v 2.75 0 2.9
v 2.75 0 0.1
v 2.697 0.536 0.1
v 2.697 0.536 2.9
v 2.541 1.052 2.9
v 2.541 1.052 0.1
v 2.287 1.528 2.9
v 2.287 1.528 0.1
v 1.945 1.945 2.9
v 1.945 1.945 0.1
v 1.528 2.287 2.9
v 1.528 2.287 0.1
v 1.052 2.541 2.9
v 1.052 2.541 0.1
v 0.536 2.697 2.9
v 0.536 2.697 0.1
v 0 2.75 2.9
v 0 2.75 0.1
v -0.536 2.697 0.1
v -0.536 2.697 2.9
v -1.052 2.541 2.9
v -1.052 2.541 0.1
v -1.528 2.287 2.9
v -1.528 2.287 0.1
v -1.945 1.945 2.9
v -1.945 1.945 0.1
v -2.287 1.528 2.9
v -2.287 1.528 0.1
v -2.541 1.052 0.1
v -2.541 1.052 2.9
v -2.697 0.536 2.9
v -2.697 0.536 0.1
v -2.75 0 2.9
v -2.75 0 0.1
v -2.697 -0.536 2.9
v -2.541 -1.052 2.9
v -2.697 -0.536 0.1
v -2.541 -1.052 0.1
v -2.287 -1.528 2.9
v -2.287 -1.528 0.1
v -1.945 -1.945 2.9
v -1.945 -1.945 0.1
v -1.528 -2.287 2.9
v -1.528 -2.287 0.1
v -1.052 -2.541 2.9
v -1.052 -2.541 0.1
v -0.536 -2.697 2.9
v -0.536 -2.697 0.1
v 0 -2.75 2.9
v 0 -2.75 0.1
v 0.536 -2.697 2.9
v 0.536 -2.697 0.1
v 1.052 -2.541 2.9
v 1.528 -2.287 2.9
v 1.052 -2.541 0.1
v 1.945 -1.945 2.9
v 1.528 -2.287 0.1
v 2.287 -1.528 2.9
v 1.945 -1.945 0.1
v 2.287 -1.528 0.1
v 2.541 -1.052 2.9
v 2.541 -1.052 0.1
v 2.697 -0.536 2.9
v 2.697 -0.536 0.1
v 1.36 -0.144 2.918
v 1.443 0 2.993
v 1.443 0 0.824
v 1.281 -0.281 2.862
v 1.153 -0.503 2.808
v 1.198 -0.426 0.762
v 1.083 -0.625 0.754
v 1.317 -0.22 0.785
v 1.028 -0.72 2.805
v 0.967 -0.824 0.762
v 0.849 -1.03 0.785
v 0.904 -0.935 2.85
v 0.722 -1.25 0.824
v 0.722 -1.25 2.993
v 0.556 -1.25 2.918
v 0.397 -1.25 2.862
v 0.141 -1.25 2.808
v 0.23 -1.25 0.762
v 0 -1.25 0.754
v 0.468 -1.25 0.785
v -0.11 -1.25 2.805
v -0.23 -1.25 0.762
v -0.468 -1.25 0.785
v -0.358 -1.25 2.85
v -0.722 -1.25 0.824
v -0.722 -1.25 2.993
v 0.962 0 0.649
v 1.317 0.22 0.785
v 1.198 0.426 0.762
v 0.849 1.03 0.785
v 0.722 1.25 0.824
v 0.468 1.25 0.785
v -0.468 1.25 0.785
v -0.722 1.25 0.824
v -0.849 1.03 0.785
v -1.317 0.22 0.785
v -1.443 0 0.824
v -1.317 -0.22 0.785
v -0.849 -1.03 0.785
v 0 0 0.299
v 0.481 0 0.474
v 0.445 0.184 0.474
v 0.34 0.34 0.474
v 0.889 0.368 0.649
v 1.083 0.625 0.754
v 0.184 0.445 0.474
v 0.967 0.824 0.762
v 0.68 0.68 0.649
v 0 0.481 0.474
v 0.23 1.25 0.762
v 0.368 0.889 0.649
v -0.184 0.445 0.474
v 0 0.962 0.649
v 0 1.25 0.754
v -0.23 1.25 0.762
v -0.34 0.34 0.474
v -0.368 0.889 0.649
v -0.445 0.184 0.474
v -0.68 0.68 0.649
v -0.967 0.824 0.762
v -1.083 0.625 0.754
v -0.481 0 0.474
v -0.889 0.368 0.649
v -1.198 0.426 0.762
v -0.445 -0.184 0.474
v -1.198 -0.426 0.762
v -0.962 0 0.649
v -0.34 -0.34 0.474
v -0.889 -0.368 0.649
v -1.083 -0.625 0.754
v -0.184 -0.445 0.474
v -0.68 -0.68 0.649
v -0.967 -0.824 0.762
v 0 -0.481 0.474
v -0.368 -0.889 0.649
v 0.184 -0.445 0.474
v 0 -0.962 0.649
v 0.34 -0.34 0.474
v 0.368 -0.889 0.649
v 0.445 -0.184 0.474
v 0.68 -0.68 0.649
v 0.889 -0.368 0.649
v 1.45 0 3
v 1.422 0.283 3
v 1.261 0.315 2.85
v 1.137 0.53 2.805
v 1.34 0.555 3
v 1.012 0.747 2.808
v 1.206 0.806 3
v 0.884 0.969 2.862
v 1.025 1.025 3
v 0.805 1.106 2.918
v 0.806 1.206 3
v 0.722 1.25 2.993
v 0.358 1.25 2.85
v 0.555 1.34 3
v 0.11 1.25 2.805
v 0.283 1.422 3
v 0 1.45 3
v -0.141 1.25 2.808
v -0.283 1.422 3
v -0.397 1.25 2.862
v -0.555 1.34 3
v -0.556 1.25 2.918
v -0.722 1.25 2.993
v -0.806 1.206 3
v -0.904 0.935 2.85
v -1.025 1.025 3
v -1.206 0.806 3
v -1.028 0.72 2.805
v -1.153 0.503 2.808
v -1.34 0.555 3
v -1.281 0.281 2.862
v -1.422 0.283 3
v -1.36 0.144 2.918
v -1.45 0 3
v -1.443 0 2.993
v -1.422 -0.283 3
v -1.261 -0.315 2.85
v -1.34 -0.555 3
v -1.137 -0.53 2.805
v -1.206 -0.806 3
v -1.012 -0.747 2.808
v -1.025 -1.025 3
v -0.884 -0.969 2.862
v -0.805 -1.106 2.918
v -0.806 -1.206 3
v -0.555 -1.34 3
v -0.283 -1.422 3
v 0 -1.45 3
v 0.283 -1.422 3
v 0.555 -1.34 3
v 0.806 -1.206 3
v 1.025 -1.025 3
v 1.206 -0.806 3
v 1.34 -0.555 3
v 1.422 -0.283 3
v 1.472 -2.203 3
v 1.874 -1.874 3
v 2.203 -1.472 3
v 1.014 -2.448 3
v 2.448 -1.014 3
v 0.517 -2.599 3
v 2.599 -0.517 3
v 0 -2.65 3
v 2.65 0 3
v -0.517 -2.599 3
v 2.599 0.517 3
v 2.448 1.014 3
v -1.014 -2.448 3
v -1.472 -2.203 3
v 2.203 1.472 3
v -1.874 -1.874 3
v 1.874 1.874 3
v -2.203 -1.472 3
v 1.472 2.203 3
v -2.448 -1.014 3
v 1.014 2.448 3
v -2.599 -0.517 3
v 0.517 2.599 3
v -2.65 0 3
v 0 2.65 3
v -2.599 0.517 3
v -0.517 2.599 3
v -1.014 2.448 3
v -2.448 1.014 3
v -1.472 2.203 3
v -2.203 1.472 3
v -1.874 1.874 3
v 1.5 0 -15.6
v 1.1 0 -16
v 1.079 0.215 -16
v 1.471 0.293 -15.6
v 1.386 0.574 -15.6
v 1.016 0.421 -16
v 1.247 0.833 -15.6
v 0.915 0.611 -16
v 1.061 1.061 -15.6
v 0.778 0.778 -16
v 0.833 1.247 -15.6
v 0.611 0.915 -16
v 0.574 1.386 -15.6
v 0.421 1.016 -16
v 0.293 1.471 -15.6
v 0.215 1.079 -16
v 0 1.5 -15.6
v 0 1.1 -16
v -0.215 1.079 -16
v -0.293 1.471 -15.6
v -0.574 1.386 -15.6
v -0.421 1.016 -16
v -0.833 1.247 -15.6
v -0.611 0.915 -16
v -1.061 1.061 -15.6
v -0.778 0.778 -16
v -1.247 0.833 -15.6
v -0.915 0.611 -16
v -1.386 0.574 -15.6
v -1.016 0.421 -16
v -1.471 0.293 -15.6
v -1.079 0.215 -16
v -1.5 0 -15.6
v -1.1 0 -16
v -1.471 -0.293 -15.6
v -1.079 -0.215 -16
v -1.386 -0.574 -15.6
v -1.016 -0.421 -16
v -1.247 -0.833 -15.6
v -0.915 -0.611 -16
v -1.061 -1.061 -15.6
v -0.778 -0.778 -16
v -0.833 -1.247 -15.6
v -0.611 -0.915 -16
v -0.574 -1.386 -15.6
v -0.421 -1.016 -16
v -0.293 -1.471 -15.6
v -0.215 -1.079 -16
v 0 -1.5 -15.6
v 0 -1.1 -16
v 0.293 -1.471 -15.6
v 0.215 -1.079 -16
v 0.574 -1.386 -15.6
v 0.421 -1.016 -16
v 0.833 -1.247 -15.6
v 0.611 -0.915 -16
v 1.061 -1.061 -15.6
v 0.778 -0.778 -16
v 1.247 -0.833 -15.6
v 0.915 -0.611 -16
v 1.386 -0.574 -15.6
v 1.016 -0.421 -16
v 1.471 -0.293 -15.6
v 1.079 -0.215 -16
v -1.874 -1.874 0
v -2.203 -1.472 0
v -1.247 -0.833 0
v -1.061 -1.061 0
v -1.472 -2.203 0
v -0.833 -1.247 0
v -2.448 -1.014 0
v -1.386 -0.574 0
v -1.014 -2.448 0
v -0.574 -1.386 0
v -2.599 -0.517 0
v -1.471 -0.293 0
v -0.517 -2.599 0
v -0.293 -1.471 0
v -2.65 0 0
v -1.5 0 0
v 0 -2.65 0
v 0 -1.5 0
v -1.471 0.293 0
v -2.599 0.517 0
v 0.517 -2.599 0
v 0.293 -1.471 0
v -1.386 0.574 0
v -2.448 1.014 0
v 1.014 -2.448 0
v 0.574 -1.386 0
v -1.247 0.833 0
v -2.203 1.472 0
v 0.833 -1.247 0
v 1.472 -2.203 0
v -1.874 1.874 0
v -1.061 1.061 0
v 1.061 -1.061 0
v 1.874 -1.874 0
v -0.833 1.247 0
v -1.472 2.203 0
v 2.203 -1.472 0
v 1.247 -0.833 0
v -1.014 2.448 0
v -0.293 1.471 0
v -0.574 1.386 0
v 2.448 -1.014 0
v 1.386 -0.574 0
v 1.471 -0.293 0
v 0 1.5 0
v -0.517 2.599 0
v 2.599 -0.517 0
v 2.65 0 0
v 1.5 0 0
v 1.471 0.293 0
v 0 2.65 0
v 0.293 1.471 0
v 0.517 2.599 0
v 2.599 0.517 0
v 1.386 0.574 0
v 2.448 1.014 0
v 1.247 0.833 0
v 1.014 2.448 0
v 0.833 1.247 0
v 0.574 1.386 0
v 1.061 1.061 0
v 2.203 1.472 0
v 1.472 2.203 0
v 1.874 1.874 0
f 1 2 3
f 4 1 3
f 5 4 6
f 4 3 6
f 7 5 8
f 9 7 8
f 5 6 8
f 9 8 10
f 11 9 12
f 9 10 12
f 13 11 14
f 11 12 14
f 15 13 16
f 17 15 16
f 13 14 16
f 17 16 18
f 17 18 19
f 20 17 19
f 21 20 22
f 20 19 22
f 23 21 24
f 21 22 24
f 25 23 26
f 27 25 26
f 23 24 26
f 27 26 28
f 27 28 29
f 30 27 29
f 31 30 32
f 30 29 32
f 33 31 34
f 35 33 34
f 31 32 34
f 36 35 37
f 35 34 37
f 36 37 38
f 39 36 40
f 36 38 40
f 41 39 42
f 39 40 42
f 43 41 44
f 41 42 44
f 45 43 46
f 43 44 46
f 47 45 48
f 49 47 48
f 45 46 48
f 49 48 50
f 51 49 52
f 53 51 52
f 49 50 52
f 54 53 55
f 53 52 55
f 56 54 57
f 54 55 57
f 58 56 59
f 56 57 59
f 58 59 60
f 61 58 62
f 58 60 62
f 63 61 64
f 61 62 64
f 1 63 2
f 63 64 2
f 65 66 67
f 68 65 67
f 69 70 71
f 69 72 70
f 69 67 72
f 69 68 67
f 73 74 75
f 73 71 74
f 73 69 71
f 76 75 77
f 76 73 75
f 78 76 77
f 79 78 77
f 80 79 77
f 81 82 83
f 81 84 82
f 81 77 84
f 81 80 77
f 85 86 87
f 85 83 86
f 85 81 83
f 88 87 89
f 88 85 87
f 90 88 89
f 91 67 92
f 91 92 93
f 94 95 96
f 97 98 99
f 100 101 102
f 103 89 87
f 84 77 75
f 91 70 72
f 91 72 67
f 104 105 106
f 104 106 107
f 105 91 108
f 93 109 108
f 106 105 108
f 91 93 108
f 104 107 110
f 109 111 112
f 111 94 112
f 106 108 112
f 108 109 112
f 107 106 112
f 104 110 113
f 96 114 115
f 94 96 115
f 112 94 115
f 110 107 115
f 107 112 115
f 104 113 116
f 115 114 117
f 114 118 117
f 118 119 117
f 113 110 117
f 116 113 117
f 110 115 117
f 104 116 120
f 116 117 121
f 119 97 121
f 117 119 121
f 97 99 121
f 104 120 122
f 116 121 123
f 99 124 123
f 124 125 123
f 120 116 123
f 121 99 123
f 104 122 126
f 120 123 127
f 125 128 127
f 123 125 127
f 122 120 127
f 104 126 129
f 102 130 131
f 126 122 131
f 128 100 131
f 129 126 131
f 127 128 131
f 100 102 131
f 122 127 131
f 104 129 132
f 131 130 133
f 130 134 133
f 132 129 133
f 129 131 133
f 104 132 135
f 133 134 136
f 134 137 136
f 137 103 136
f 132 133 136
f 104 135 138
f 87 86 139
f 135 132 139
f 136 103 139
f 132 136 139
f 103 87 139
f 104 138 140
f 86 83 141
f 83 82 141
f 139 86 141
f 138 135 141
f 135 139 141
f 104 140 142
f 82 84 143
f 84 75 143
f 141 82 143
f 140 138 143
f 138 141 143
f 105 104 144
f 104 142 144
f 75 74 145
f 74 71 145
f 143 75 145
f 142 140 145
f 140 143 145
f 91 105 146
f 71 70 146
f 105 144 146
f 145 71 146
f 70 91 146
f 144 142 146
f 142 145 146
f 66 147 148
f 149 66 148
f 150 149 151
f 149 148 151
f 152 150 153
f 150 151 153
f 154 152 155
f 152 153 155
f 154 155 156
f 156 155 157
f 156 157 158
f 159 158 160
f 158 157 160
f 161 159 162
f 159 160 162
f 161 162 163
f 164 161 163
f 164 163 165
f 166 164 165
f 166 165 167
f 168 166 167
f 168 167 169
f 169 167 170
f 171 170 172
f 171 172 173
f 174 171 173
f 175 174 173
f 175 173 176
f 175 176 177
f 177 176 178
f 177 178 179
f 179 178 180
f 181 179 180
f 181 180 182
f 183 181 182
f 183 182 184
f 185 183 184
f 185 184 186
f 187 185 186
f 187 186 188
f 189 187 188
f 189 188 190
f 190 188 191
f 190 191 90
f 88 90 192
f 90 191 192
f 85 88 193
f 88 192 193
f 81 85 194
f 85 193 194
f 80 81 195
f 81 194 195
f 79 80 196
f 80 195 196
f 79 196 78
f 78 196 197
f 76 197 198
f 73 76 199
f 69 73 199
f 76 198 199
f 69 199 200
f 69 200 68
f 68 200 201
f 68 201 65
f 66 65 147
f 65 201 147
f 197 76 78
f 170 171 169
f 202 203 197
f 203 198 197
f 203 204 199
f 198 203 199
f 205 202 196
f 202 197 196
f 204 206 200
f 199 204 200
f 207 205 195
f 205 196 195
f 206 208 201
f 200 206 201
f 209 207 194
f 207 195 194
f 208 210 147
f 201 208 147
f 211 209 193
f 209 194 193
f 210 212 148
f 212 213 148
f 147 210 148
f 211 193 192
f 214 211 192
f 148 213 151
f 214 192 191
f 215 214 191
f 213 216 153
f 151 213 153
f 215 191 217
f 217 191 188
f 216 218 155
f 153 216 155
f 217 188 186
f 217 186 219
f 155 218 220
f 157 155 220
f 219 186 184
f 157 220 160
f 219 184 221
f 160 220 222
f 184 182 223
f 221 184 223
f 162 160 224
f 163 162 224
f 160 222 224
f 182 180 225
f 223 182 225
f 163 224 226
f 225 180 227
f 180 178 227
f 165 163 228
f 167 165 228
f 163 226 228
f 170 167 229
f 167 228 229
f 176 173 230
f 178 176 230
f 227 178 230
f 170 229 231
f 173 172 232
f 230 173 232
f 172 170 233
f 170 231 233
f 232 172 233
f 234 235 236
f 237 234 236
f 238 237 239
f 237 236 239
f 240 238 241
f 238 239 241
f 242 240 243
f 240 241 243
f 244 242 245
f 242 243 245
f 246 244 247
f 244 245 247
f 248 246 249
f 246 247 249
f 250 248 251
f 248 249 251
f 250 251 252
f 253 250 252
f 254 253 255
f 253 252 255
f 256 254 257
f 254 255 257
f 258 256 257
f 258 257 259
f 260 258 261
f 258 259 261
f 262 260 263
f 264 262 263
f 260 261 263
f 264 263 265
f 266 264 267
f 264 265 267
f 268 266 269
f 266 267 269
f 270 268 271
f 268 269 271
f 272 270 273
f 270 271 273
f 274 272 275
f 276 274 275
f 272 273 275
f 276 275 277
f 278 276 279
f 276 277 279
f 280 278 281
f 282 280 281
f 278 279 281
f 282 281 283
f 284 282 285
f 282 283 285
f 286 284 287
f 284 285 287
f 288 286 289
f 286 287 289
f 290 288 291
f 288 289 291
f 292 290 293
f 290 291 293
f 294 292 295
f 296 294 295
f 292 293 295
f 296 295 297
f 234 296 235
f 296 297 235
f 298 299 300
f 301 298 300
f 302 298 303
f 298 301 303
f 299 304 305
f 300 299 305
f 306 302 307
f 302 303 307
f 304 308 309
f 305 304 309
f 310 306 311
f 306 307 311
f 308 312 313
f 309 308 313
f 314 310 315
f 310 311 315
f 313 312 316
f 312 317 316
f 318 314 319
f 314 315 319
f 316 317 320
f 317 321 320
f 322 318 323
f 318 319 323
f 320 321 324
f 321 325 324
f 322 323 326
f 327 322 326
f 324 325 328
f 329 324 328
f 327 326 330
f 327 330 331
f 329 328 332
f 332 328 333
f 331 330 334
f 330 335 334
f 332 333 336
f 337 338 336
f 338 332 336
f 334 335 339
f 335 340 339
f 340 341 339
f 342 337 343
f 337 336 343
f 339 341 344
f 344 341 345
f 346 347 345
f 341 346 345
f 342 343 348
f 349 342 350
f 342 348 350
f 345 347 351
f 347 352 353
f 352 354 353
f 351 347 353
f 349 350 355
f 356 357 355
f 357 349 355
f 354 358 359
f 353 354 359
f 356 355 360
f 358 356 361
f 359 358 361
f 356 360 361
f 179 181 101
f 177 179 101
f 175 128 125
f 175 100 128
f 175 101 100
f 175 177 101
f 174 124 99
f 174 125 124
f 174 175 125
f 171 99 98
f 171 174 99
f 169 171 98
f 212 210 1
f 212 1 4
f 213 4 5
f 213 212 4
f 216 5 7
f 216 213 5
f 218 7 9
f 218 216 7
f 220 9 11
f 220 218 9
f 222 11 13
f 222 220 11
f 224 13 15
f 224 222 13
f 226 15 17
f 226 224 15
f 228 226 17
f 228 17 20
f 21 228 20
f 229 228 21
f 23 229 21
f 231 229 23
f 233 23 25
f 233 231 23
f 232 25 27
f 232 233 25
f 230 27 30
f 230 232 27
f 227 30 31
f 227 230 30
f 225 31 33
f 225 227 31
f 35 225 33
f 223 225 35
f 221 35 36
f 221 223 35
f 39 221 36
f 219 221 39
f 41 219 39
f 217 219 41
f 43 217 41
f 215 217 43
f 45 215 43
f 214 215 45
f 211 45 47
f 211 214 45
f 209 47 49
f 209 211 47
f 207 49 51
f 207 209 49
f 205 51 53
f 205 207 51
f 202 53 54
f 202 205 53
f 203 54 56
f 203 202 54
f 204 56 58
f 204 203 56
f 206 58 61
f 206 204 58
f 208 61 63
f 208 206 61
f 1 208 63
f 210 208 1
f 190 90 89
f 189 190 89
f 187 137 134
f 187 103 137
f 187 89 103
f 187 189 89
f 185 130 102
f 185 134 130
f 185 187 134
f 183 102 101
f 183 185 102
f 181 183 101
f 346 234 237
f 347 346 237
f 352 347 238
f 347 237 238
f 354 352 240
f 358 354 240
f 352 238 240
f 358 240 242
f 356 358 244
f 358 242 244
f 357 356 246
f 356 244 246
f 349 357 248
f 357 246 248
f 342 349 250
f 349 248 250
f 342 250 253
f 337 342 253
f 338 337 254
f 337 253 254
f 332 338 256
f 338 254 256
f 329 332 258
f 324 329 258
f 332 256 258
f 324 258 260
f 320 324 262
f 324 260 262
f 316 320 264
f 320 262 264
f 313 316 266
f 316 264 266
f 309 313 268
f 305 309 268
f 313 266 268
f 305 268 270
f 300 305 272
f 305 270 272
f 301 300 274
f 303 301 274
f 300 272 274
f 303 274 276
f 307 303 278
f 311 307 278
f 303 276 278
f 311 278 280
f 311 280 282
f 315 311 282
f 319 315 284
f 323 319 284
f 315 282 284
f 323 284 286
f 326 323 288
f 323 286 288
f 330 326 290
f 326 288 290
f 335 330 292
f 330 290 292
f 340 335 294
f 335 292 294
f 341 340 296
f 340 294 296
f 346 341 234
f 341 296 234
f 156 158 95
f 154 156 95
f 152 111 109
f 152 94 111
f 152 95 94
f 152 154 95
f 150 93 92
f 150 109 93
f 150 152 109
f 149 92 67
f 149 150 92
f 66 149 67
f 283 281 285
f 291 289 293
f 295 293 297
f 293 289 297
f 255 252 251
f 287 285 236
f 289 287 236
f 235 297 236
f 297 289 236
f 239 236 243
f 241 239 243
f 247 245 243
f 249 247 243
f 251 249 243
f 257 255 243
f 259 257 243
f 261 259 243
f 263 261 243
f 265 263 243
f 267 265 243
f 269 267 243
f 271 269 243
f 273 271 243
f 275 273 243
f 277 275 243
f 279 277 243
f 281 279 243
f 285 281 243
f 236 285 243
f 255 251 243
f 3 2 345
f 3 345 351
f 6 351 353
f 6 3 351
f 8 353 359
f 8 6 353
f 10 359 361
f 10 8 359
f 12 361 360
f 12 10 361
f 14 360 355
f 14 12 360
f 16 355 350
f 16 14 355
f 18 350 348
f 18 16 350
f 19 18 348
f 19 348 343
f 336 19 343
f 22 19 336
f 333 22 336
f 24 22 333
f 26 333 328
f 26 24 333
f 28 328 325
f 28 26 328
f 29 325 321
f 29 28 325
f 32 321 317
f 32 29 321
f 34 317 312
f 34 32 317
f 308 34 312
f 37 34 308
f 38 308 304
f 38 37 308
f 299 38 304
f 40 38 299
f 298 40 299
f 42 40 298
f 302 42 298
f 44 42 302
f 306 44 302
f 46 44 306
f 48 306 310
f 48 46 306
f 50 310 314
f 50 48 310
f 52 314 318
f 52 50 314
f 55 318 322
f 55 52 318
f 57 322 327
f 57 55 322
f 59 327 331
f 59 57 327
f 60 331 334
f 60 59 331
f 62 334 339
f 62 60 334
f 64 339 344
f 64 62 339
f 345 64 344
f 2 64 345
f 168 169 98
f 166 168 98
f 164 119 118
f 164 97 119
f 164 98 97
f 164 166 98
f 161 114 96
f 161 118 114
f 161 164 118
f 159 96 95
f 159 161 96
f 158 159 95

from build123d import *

# Parameters (mm, degrees)
SKETCH001_R     = 3.75
POCKET_DEPTH    = 9.70192
CHAMFER_SIZE    = 0.4
CHAMFER001_SIZE = 0.1


with BuildPart() as pocket:
    # Sketch003 → Revolution001 (revolve)
    with BuildSketch(Plane.XZ):
        Polygon((0, 0.29908), (2.75, 1.3), (2.75, 10), (0, 10), align=None)
    revolve(axis=Axis((0, 0, 0), (0, 0, 1)))

    # Sketch001 → Pocket (cut, through all)
    with BuildSketch(Plane(origin=(0, 0, 10), x_dir=(-1, 0, 0), z_dir=(0, 0, 1))):
        Circle(SKETCH001_R)
        Polygon((-0.721688, 1.25), (0.721688, 1.25), (1.443376, 0), (0.721688, -1.25), (-0.721688, -1.25), (-1.443376, 0), align=None, mode=Mode.SUBTRACT)
    extrude(amount=-POCKET_DEPTH, mode=Mode.SUBTRACT)


with BuildPart() as chamfer001:
    # Sketch → Revolution (revolve)
    with BuildSketch(Plane.XZ):
        Polygon((1.45, 3), (2.75, 3), (2.75, 0), (1.5, 0), (1.5, -16), (0, -16), (0, 1.549999), align=None)
    revolve(axis=Axis((0, 0, 0), (0, 0, 1)))

    # Cut: cut Pocket
    add(pocket.part, mode=Mode.SUBTRACT)

    # Chamfer
    chamfer_edges = [chamfer001.edges().sort_by_distance(p)[0] for p in [
        (-1.5, 0, -16),
    ]]
    chamfer(chamfer_edges, length=CHAMFER_SIZE)

    # Chamfer001
    chamfer001_edges = [chamfer001.edges().sort_by_distance(p)[0] for p in [
        (-2.75, 0, 0),
        (-2.75, 0, 3),
    ]]
    chamfer(chamfer001_edges, length=CHAMFER001_SIZE)


solid = chamfer001.part
